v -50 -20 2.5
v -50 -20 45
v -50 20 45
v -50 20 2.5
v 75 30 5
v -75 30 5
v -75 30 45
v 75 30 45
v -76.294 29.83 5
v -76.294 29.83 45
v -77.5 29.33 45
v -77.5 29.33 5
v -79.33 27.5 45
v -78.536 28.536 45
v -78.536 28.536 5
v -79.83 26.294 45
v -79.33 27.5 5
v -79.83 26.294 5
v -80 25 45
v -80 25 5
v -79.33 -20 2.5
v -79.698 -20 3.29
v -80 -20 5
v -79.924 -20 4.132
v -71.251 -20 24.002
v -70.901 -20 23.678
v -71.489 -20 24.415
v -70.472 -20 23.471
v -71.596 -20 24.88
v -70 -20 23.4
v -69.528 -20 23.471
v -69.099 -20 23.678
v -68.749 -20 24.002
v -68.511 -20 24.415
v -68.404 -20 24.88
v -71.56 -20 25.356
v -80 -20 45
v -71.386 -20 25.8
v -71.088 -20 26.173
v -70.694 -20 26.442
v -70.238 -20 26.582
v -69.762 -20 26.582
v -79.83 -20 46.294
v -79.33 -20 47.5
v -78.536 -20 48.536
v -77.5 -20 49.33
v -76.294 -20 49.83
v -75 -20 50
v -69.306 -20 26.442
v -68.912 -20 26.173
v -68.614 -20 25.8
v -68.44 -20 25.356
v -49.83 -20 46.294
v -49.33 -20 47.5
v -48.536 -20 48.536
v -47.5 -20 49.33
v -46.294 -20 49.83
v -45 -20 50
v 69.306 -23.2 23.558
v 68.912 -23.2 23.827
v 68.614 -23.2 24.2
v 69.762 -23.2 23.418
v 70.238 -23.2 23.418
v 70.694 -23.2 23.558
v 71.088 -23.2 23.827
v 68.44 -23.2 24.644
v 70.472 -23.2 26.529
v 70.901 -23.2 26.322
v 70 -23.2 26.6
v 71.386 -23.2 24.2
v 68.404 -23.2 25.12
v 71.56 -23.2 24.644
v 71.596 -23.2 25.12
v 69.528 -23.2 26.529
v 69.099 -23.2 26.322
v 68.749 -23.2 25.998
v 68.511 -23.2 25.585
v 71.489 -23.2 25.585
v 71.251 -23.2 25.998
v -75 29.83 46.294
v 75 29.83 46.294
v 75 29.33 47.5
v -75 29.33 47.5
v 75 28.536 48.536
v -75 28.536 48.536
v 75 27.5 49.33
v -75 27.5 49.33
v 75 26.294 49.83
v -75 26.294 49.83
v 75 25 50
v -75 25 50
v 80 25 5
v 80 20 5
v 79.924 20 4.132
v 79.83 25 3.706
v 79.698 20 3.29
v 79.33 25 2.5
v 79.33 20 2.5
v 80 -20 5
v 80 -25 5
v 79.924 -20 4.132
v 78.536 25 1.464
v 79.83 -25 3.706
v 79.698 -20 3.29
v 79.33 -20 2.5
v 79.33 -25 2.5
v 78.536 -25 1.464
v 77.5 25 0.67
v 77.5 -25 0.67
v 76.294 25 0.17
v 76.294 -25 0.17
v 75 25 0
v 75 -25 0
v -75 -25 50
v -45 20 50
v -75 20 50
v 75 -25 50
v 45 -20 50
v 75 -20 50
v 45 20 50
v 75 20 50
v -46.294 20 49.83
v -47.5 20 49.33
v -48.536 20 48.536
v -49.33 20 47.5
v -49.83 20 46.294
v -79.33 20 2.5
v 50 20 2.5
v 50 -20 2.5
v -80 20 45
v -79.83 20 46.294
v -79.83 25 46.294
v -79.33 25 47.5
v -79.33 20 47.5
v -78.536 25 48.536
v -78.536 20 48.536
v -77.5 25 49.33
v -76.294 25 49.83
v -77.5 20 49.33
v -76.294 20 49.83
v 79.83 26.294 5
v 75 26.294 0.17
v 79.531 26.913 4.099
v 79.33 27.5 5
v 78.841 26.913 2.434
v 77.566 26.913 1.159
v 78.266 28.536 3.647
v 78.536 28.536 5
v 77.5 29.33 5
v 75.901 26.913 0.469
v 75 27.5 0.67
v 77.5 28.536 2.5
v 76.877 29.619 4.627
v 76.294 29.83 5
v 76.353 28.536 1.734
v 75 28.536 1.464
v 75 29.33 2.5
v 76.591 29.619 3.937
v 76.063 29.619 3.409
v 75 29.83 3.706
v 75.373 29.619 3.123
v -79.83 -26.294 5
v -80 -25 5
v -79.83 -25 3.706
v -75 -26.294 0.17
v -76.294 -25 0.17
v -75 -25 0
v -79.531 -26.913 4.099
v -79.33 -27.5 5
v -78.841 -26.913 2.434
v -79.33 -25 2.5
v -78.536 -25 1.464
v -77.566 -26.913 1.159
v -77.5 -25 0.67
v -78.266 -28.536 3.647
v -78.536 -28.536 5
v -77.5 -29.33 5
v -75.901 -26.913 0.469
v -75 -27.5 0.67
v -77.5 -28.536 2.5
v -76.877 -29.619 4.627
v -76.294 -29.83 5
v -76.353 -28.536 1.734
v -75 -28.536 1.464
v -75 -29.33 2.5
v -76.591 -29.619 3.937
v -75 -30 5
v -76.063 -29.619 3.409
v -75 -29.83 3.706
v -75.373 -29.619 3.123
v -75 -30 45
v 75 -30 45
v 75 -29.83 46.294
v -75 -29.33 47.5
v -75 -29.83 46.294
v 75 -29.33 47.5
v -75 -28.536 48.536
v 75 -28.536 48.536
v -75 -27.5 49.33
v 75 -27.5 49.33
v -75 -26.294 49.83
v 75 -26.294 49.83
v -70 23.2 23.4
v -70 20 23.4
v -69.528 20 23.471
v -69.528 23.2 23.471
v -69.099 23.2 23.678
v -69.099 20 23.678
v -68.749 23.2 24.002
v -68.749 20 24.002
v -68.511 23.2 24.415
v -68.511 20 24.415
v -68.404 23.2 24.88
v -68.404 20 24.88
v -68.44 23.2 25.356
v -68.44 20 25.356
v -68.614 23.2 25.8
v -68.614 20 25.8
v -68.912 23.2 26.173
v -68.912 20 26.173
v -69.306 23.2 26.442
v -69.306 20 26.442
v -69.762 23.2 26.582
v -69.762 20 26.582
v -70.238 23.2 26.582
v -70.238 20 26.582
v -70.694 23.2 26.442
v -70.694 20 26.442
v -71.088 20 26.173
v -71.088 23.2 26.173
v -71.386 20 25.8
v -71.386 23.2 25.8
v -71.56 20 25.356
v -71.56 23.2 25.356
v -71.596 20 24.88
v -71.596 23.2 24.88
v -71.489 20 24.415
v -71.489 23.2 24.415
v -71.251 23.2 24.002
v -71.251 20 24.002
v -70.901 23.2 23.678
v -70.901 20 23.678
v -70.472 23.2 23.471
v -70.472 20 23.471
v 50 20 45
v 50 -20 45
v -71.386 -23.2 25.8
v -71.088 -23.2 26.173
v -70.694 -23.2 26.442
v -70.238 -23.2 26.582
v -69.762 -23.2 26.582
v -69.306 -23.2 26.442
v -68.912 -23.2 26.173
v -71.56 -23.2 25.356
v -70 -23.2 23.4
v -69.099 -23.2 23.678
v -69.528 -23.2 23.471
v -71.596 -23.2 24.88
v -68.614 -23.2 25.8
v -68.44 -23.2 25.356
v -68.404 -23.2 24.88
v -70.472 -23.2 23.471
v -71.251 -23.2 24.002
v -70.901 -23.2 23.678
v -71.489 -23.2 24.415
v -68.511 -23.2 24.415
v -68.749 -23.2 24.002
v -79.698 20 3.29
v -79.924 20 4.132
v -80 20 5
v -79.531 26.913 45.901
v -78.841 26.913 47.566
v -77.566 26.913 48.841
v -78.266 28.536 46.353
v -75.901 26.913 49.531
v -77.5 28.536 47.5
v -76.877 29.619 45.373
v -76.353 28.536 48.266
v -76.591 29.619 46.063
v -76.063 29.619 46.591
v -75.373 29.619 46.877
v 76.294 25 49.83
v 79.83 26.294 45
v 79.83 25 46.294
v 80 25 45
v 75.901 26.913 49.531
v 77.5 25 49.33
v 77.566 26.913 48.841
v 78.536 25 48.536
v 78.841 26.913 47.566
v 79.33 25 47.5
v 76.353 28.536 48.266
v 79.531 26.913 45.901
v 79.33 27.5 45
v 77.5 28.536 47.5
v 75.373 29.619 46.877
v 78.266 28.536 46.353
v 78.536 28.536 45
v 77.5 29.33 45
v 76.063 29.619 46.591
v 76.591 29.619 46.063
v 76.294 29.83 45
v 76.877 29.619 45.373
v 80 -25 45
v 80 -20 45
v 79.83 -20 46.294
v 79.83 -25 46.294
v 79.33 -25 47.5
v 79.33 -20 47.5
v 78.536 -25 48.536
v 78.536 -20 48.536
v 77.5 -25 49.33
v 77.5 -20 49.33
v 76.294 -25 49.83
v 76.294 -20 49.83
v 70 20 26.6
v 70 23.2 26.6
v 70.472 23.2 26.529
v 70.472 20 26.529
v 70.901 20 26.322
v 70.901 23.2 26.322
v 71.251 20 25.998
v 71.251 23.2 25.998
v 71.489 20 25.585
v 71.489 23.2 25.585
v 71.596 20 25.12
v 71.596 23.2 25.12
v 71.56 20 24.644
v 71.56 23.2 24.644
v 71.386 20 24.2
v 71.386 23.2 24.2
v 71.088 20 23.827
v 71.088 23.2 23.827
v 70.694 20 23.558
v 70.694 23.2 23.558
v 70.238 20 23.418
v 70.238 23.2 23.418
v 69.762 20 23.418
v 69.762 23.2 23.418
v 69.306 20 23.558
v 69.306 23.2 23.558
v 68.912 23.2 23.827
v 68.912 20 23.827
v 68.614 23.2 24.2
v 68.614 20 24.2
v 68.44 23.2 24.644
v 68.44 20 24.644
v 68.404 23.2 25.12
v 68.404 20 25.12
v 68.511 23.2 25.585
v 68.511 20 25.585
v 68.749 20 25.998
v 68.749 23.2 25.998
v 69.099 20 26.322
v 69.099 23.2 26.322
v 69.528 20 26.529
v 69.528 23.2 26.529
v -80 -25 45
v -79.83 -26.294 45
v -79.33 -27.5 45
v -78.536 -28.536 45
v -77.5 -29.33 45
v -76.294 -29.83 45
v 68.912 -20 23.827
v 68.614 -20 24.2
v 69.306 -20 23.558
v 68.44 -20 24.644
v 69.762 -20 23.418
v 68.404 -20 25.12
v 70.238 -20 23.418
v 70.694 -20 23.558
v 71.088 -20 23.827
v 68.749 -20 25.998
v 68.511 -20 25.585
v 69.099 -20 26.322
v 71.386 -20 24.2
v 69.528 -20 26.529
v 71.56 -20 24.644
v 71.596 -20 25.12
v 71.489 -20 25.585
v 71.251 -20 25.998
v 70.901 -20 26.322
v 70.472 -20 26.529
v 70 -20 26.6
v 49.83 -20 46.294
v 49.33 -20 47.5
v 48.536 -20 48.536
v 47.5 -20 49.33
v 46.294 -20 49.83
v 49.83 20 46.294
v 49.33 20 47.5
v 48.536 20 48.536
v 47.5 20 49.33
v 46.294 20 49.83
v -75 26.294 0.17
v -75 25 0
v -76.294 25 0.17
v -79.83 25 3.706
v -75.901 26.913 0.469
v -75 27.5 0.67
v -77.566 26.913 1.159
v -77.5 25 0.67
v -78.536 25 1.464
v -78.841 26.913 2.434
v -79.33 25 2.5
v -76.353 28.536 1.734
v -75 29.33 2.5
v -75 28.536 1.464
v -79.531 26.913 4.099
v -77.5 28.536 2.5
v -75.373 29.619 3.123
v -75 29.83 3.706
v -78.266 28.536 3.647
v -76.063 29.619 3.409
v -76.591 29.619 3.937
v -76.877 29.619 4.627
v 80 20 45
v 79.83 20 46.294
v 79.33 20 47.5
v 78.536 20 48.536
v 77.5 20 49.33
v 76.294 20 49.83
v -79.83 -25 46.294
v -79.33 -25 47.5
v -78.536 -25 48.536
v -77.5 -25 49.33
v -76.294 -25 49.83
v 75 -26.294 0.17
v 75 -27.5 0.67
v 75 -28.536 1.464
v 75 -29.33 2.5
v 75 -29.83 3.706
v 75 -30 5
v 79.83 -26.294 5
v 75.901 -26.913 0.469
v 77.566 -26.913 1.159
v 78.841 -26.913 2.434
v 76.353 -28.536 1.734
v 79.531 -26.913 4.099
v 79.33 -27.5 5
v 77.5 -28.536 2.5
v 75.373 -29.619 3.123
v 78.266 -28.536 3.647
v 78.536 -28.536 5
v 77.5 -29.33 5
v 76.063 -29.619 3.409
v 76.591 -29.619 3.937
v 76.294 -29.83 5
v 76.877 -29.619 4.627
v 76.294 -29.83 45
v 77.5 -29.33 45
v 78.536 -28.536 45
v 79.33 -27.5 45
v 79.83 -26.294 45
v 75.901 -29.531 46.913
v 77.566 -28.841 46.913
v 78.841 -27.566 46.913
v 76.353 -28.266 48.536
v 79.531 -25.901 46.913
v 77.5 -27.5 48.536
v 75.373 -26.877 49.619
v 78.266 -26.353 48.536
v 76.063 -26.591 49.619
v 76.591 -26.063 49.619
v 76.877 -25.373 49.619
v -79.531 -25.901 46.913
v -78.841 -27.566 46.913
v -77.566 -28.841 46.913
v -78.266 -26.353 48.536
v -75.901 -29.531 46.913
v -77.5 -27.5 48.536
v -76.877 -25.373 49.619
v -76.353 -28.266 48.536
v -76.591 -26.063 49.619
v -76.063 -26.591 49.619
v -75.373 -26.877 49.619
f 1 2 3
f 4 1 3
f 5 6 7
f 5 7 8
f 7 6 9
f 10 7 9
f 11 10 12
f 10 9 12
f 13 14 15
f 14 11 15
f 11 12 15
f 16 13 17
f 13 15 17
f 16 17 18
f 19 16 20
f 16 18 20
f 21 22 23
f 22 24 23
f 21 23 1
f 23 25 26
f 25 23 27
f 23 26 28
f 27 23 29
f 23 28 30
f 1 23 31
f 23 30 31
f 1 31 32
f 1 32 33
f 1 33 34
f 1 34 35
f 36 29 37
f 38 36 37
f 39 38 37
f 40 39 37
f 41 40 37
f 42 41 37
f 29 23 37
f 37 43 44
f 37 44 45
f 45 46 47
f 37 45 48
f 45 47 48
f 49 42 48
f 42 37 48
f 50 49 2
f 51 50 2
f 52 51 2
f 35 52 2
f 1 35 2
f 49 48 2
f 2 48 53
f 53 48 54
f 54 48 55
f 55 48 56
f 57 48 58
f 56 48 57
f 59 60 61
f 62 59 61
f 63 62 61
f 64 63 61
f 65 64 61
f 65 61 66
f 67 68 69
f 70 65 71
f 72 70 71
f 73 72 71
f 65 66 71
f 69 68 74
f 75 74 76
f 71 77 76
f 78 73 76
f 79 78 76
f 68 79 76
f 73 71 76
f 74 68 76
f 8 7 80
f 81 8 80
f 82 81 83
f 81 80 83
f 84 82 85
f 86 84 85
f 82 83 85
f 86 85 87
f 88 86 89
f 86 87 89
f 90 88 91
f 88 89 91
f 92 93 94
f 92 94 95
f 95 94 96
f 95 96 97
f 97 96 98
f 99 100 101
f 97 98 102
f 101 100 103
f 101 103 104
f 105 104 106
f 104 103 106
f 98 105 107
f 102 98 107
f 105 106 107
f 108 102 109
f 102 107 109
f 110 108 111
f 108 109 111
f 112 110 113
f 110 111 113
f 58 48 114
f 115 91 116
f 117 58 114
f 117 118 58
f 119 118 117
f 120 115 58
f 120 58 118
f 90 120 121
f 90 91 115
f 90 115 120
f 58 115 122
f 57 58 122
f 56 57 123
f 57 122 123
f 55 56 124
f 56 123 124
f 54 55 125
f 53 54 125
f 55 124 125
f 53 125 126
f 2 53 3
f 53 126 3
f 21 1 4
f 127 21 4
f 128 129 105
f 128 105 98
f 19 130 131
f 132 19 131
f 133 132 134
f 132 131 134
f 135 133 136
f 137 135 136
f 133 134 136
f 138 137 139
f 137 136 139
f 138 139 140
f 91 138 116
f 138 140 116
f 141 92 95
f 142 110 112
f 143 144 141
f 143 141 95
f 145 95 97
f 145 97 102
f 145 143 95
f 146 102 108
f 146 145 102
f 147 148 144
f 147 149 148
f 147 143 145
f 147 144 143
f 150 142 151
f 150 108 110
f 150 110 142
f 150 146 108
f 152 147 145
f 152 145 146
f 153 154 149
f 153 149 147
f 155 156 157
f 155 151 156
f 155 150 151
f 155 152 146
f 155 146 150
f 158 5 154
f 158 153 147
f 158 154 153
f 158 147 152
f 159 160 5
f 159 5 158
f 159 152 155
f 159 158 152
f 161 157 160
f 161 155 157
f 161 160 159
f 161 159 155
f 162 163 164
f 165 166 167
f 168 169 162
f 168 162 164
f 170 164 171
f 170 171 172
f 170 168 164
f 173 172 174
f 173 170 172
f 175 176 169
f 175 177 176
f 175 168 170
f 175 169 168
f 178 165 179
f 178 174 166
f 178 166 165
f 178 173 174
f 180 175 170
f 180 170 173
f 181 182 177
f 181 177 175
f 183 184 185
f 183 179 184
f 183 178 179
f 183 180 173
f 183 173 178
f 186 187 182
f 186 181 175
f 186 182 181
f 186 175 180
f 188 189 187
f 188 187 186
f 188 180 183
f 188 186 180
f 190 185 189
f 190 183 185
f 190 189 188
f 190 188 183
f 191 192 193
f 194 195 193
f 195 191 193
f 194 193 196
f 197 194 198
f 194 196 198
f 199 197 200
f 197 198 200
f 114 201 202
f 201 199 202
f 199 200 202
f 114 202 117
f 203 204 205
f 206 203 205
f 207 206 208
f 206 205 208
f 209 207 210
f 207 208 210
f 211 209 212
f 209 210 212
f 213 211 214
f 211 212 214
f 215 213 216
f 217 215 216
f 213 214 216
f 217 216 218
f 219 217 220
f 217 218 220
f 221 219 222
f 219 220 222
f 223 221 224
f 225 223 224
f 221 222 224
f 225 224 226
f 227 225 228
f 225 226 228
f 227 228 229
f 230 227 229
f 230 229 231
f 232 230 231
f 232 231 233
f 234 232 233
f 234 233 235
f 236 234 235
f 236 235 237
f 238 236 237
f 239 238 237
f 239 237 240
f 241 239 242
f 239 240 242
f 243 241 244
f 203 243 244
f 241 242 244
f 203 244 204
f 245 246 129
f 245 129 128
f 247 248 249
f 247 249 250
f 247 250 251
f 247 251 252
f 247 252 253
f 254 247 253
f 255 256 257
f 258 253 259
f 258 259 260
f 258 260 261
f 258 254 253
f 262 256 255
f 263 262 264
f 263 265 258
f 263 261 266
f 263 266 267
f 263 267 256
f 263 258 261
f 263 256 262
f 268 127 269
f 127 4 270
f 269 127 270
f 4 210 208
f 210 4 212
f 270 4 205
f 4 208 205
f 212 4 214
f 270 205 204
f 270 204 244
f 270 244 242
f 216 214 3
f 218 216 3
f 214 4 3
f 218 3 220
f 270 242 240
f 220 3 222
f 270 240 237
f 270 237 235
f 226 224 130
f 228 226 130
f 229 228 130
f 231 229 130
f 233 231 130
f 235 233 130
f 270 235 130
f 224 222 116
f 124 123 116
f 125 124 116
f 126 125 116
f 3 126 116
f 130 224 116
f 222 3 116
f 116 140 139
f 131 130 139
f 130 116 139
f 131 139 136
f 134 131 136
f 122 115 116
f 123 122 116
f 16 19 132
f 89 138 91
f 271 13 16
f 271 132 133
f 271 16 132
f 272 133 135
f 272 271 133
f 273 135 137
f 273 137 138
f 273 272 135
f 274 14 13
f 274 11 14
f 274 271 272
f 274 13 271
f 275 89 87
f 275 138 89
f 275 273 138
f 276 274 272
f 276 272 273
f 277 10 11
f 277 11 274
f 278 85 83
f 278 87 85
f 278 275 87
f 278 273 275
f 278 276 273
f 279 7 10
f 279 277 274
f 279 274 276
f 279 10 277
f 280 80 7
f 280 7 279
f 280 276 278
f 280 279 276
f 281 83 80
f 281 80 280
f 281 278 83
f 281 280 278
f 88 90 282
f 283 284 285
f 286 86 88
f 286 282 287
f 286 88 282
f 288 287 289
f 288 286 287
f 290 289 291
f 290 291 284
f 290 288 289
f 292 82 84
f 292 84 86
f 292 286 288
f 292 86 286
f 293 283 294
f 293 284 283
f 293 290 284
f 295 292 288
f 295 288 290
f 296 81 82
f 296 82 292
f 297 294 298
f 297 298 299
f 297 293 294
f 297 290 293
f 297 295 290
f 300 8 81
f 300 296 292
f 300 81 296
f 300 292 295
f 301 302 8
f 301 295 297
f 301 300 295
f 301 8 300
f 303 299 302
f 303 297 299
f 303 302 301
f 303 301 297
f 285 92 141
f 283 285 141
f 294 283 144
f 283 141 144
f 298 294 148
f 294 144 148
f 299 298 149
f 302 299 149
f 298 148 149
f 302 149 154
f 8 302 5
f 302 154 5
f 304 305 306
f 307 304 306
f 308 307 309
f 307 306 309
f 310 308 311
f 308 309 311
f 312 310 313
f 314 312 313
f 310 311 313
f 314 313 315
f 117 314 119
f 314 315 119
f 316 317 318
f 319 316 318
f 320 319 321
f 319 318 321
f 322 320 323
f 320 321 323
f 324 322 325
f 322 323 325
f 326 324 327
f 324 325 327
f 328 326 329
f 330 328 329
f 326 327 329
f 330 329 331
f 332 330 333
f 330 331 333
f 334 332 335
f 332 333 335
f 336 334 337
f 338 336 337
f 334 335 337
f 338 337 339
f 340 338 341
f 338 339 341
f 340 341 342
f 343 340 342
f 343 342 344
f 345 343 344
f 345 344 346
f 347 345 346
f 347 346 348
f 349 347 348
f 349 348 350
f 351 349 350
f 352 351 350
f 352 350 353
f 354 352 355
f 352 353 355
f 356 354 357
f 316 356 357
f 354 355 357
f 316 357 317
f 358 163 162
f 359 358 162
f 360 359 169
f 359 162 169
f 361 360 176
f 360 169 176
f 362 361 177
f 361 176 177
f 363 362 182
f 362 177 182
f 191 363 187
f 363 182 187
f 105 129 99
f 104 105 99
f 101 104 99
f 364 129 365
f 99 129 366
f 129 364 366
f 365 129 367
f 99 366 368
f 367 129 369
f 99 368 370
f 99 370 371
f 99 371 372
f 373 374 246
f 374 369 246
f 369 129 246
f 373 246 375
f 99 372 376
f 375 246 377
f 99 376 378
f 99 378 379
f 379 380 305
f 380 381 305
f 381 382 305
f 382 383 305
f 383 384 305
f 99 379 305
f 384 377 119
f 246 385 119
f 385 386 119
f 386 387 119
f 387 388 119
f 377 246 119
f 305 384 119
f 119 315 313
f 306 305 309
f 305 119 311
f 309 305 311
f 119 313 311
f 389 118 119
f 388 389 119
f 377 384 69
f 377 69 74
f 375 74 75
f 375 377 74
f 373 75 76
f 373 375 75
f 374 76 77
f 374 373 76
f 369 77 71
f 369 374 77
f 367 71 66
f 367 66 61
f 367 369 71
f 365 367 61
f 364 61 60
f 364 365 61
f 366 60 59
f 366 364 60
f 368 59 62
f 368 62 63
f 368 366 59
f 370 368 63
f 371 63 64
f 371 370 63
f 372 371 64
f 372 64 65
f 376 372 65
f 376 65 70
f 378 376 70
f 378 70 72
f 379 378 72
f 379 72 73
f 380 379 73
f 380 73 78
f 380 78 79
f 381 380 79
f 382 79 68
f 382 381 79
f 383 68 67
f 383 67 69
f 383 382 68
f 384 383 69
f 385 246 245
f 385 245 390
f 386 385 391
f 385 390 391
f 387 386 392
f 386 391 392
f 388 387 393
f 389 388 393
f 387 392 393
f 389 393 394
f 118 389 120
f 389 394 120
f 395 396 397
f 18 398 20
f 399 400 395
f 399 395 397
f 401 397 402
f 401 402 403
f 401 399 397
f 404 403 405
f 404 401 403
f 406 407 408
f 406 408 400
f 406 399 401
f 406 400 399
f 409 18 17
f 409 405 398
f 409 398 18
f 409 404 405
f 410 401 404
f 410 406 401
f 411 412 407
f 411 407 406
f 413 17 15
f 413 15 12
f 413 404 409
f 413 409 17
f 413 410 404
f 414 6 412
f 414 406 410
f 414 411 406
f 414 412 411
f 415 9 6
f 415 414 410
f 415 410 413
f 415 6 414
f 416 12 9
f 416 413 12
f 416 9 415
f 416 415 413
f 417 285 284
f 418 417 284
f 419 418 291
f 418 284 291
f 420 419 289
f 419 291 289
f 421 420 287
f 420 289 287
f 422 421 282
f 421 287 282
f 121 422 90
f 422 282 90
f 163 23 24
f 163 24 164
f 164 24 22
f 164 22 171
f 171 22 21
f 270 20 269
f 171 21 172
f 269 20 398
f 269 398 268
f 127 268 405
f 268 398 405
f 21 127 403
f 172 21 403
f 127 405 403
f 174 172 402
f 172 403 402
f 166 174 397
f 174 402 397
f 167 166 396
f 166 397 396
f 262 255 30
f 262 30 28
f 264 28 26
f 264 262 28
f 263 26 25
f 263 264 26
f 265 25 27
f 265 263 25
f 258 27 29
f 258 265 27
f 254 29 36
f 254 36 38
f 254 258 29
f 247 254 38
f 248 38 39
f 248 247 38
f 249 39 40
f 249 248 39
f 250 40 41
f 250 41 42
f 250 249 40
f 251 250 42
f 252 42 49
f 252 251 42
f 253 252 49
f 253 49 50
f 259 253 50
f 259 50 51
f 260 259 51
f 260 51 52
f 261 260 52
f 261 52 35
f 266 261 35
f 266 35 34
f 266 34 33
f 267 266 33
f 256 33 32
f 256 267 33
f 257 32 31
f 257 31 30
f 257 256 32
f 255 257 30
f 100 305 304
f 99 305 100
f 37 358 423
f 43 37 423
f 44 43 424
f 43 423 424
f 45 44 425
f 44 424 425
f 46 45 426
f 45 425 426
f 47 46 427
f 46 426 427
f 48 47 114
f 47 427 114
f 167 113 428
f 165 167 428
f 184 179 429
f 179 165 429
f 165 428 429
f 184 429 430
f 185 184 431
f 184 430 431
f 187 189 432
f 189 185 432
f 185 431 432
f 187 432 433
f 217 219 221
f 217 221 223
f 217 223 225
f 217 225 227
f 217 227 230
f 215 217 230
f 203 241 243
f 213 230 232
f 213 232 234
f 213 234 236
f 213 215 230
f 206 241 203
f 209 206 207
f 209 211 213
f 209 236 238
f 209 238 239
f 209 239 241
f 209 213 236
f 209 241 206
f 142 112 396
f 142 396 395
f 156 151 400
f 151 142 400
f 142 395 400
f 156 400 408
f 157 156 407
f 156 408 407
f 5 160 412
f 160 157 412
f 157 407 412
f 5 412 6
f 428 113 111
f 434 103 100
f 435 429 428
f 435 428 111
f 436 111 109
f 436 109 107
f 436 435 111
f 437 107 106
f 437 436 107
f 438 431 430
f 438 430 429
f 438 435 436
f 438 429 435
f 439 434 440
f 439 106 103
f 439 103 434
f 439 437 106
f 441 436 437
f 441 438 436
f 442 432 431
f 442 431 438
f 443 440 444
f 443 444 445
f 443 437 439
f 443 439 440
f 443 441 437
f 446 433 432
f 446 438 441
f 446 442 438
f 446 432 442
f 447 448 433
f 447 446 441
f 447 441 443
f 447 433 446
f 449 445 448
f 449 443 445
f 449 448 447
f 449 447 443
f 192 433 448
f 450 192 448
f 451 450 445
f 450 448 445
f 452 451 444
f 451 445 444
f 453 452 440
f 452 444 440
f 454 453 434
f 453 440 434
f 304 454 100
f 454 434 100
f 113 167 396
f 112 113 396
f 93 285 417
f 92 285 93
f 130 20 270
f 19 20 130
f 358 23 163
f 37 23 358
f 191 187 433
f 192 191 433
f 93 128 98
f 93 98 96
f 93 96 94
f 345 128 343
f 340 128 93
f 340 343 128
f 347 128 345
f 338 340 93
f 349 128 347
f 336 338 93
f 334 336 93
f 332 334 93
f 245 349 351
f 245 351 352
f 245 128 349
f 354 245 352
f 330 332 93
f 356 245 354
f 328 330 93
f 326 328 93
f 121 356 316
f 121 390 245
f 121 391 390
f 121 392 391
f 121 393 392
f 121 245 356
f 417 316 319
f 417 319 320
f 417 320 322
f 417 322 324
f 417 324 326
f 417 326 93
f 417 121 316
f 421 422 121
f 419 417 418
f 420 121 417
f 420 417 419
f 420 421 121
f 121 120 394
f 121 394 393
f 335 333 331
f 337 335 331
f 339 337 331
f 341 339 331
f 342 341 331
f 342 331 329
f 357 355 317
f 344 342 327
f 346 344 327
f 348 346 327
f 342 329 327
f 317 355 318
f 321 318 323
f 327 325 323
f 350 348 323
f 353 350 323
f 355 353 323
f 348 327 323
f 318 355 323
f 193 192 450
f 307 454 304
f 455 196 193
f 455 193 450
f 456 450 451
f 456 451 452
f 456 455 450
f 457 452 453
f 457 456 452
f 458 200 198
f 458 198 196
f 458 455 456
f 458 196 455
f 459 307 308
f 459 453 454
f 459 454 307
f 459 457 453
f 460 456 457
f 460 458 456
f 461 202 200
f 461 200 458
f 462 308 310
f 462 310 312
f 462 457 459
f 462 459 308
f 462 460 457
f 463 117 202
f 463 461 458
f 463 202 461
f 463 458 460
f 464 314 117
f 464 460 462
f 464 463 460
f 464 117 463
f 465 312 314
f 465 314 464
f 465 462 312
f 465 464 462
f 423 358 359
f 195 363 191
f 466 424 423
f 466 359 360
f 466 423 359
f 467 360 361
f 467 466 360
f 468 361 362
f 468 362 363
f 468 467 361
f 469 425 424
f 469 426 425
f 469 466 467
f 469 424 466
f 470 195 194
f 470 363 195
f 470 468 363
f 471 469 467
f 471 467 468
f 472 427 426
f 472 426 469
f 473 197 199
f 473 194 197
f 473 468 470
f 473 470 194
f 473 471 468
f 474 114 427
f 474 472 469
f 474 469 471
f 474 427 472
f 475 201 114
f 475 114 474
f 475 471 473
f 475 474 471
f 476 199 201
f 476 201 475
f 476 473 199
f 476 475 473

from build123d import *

# Parameters (mm, degrees)
SKETCH2_W           = 160
SKETCH2_H           = 60
BOSS_EXTRUDE1_DEPTH = 50
SKETCH4_W           = 30
SKETCH4_H           = 40
CUT_EXTRUDE1_DEPTH  = 99.994949366
SKETCH5_R           = 1.6
CUT_EXTRUDE2_DEPTH  = 3.2
CUT_EXTRUDE3_START  = -3.2
SKETCH6_R           = 1.6
CUT_EXTRUDE3_DEPTH  = 3.2
CUT_EXTRUDE5_START  = -6.8
SKETCH7_R           = 1.6
CUT_EXTRUDE5_DEPTH  = 3.2
CUT_EXTRUDE6_START  = -10
SKETCH8_R           = 1.6
CUT_EXTRUDE6_DEPTH  = 3.2
SKETCH9_W           = 2.5
SKETCH9_H           = 40
BOSS_EXTRUDE2_DEPTH = 30
SKETCH10_W          = 2.5
SKETCH10_H          = 40
BOSS_EXTRUDE3_DEPTH = 30
FILLET1_R           = 5


with BuildPart() as part:
    # Sketch2 → Boss-Extrude1 (new body)
    with BuildSketch(Plane.XY):
        Rectangle(SKETCH2_W, SKETCH2_H)
    extrude(amount=BOSS_EXTRUDE1_DEPTH)

    # Sketch4 → Cut-Extrude1 (cut, through all)
    with BuildSketch(Plane.XY.offset(50)):
        with Locations((65, 0)):
            Rectangle(SKETCH4_W, SKETCH4_H)
        with Locations((-65, 0)):
            Rectangle(SKETCH4_W, SKETCH4_H)
    extrude(amount=-CUT_EXTRUDE1_DEPTH, mode=Mode.SUBTRACT)

    # Sketch5 → Cut-Extrude2 (cut)
    with BuildSketch(Plane(origin=(0, 20, 0), x_dir=(-1, 0, 0), z_dir=(0, -1, 0))):
        with Locations(Location((70, -25, 0), (0, 0, 90))):
            Circle(SKETCH5_R)
    extrude(amount=-CUT_EXTRUDE2_DEPTH, mode=Mode.SUBTRACT)

    # Sketch6 → Cut-Extrude3 (cut)
    with BuildSketch(Plane(origin=(0, -20, 0), x_dir=(1, 0, 0), z_dir=(0, 1, 0)).offset(CUT_EXTRUDE3_START)):
        with Locations(Location((-70, -25, 0), (0, 0, 90))):
            Circle(SKETCH6_R)
    extrude(amount=CUT_EXTRUDE3_DEPTH, mode=Mode.SUBTRACT)

    # Sketch7 → Cut-Extrude5 (cut)
    with BuildSketch(Plane(origin=(0, 30, 0), x_dir=(1, 0, 0), z_dir=(0, 1, 0)).offset(CUT_EXTRUDE5_START)):
        with Locations(Location((70, -25, 0), (0, 0, 270))):
            Circle(SKETCH7_R)
    extrude(amount=-CUT_EXTRUDE5_DEPTH, mode=Mode.SUBTRACT)

    # Sketch8 → Cut-Extrude6 (cut)
    with BuildSketch(Plane.XZ.offset(30).offset(CUT_EXTRUDE6_START)):
        with Locations(Location((70, 25, 0), (0, 0, 90))):
            Circle(SKETCH8_R)
    extrude(amount=CUT_EXTRUDE6_DEPTH, mode=Mode.SUBTRACT)

    # Sketch9 → Boss-Extrude2 (add)
    with BuildSketch(Plane.ZY.offset(50)):
        with Locations((1.25, 0)):
            Rectangle(SKETCH9_W, SKETCH9_H)
    extrude(amount=BOSS_EXTRUDE2_DEPTH)

    # Sketch10 → Boss-Extrude3 (add)
    with BuildSketch(Plane(origin=(50, 0, 0), x_dir=(0, 0, -1), z_dir=(1, 0, 0))):
        with Locations((-1.25, 0)):
            Rectangle(SKETCH10_W, SKETCH10_H)
    extrude(amount=BOSS_EXTRUDE3_DEPTH)

    # Fillet1
    # the kernel refuses this fillet: 5 mm, written as the material it takes off along each edge
    with BuildSketch(Plane(origin=(-75, -25, 45), x_dir=(0, -1, 0), z_dir=(0, 0, 1))) as fillet1_piece_1_section:
        Polygon((0, 0), (FILLET1_R, 0), (FILLET1_R, -FILLET1_R), (0, -FILLET1_R), align=None)
    fillet1_piece_1 = extrude(amount=FILLET1_R, mode=Mode.PRIVATE)
    fillet1_piece_1 = fillet1_piece_1 - Plane(origin=(-75, -25, 45), x_dir=(0.7071067811865475, 0.7071067811865475, 0), z_dir=(0, 0, 1)) * Sphere(FILLET1_R, mode=Mode.PRIVATE)
    add(fillet1_piece_1, mode=Mode.SUBTRACT)
    with BuildSketch(Plane(origin=(-75, 25, 45), x_dir=(0, 0, 1), z_dir=(0, 1, 0))) as fillet1_piece_2_section:
        Polygon((0, 0), (FILLET1_R, 0), (FILLET1_R, -FILLET1_R), (0, -FILLET1_R), align=None)
    fillet1_piece_2 = extrude(amount=FILLET1_R, mode=Mode.PRIVATE)
    fillet1_piece_2 = fillet1_piece_2 - Plane(origin=(-75, 25, 45), x_dir=(0.7071067811865475, 0, -0.7071067811865475), z_dir=(0, 1, 0)) * Sphere(FILLET1_R, mode=Mode.PRIVATE)
    add(fillet1_piece_2, mode=Mode.SUBTRACT)
    with BuildSketch(Plane(origin=(75, 25, 45), x_dir=(0, 0, 1), z_dir=(0, 1, 0))) as fillet1_piece_3_section:
        Polygon((0, 0), (FILLET1_R, 0), (FILLET1_R, FILLET1_R), (0, FILLET1_R), align=None)
    fillet1_piece_3 = extrude(amount=FILLET1_R, mode=Mode.PRIVATE)
    fillet1_piece_3 = fillet1_piece_3 - Plane(origin=(75, 25, 45), x_dir=(-0.7071067811865475, 0, -0.7071067811865475), z_dir=(0, 1, 0)) * Sphere(FILLET1_R, mode=Mode.PRIVATE)
    add(fillet1_piece_3, mode=Mode.SUBTRACT)
    with BuildSketch(Plane(origin=(75, -25, 45), x_dir=(0, -1, 0), z_dir=(0, 0, 1))) as fillet1_piece_4_section:
        Polygon((0, 0), (FILLET1_R, 0), (FILLET1_R, FILLET1_R), (0, FILLET1_R), align=None)
    fillet1_piece_4 = extrude(amount=FILLET1_R, mode=Mode.PRIVATE)
    fillet1_piece_4 = fillet1_piece_4 - Plane(origin=(75, -25, 45), x_dir=(-0.7071067811865476, 0.7071067811865475, 0), z_dir=(0, 0, 1)) * Sphere(FILLET1_R, mode=Mode.PRIVATE)
    add(fillet1_piece_4, mode=Mode.SUBTRACT)
    with BuildSketch(Plane(origin=(75, -25, 5), x_dir=(0, 0, -1), z_dir=(0, -1, 0))) as fillet1_piece_5_section:
        Polygon((0, 0), (FILLET1_R, 0), (FILLET1_R, FILLET1_R), (0, FILLET1_R), align=None)
    fillet1_piece_5 = extrude(amount=FILLET1_R, mode=Mode.PRIVATE)
    fillet1_piece_5 = fillet1_piece_5 - Plane(origin=(75, -25, 5), x_dir=(-0.7071067811865475, 0, 0.7071067811865475), z_dir=(0, -1, 0)) * Sphere(FILLET1_R, mode=Mode.PRIVATE)
    add(fillet1_piece_5, mode=Mode.SUBTRACT)
    with BuildSketch(Plane(origin=(75, 25, 5), x_dir=(0, 0, -1), z_dir=(0, 1, 0))) as fillet1_piece_6_section:
        Polygon((0, 0), (FILLET1_R, 0), (FILLET1_R, -FILLET1_R), (0, -FILLET1_R), align=None)
    fillet1_piece_6 = extrude(amount=FILLET1_R, mode=Mode.PRIVATE)
    fillet1_piece_6 = fillet1_piece_6 - Plane(origin=(75, 25, 5), x_dir=(-0.7071067811865475, 0, 0.7071067811865475), z_dir=(0, 1, 0)) * Sphere(FILLET1_R, mode=Mode.PRIVATE)
    add(fillet1_piece_6, mode=Mode.SUBTRACT)
    with BuildSketch(Plane(origin=(-75, 25, 5), x_dir=(0, 0, -1), z_dir=(0, 1, 0))) as fillet1_piece_7_section:
        Polygon((0, 0), (FILLET1_R, 0), (FILLET1_R, FILLET1_R), (0, FILLET1_R), align=None)
    fillet1_piece_7 = extrude(amount=FILLET1_R, mode=Mode.PRIVATE)
    fillet1_piece_7 = fillet1_piece_7 - Plane(origin=(-75, 25, 5), x_dir=(0.7071067811865475, 0, 0.7071067811865475), z_dir=(0, 1, 0)) * Sphere(FILLET1_R, mode=Mode.PRIVATE)
    add(fillet1_piece_7, mode=Mode.SUBTRACT)
    with BuildSketch(Plane(origin=(-75, -25, 5), x_dir=(0, 0, -1), z_dir=(0, -1, 0))) as fillet1_piece_8_section:
        Polygon((0, 0), (FILLET1_R, 0), (FILLET1_R, -FILLET1_R), (0, -FILLET1_R), align=None)
    fillet1_piece_8 = extrude(amount=FILLET1_R, mode=Mode.PRIVATE)
    fillet1_piece_8 = fillet1_piece_8 - Plane(origin=(-75, -25, 5), x_dir=(0.7071067811865475, 0, 0.7071067811865475), z_dir=(0, -1, 0)) * Sphere(FILLET1_R, mode=Mode.PRIVATE)
    add(fillet1_piece_8, mode=Mode.SUBTRACT)
    with BuildSketch(Plane(origin=(-80, -25, 50), x_dir=(1, 0, 0), z_dir=(0, 1, 0)), Plane(origin=(-80, 7.5, 50), x_dir=(1, 0, 0), z_dir=(0, 1, 0)), Plane(origin=(80, 25, 50), x_dir=(-1, 0, 0), z_dir=(0, -1, 0)), Plane(origin=(80, -7.5, 50), x_dir=(-1, 0, 0), z_dir=(0, -1, 0))) as fillet1_piece_9:
        with BuildLine():
            CenterArc((FILLET1_R, FILLET1_R), FILLET1_R, 180, 90)
            Line((0, FILLET1_R), (0, 0))
            Line((0, 0), (FILLET1_R, 0))
        make_face()
    extrude(amount=17.5, mode=Mode.SUBTRACT)
    with BuildSketch(Plane(origin=(50, 20, 50), x_dir=(-1, 0, 0), z_dir=(0, -1, 0)), Plane(origin=(80, 30, 5), x_dir=(-1, 0, 0), z_dir=(0, 0, 1)), Plane(origin=(-80, -30, 5), x_dir=(1, 0, 0), z_dir=(0, 0, 1))) as fillet1_piece_10:
        with BuildLine():
            CenterArc((FILLET1_R, FILLET1_R), FILLET1_R, 180, 90)
            Line((0, FILLET1_R), (0, 0))
            Line((0, 0), (FILLET1_R, 0))
        make_face()
    extrude(amount=40, mode=Mode.SUBTRACT)
    with BuildSketch(Plane(origin=(80, -30, 5), x_dir=(-1, 0, 0), z_dir=(0, 0, 1)), Plane(origin=(-80, 30, 5), x_dir=(1, 0, 0), z_dir=(0, 0, 1)), Plane(origin=(-50, 20, 50), x_dir=(1, 0, 0), z_dir=(0, -1, 0))) as fillet1_piece_11:
        with BuildLine():
            CenterArc((FILLET1_R, -FILLET1_R), FILLET1_R, 90, 90)
            Line((0, -FILLET1_R), (0, 0))
            Line((0, 0), (FILLET1_R, 0))
        make_face()
    extrude(amount=40, mode=Mode.SUBTRACT)
    with BuildSketch(Plane(origin=(80, -25, 0), x_dir=(-1, 0, 0), z_dir=(0, 1, 0)), Plane(origin=(-80, 25, 0), x_dir=(1, 0, 0), z_dir=(0, -1, 0))) as fillet1_piece_12:
        with BuildLine():
            CenterArc((FILLET1_R, FILLET1_R), FILLET1_R, 180, 90)
            Line((0, FILLET1_R), (0, 0))
            Line((0, 0), (FILLET1_R, 0))
        make_face()
    extrude(amount=50, mode=Mode.SUBTRACT)
    with BuildSketch(Plane(origin=(-75, 30, 0), x_dir=(0, 0, 1), z_dir=(1, 0, 0)), Plane(origin=(75, -30, 0), x_dir=(0, 0, 1), z_dir=(-1, 0, 0)), Plane(origin=(75, -30, 50), x_dir=(0, 1, 0), z_dir=(-1, 0, 0))) as fillet1_piece_13:
        with BuildLine():
            CenterArc((FILLET1_R, FILLET1_R), FILLET1_R, 180, 90)
            Line((0, FILLET1_R), (0, 0))
            Line((0, 0), (FILLET1_R, 0))
        make_face()
    extrude(amount=150, mode=Mode.SUBTRACT)
    with BuildSketch(Plane(origin=(-75, 30, 50), x_dir=(0, 0, -1), z_dir=(1, 0, 0))) as fillet1_piece_14:
        with BuildLine():
            CenterArc((FILLET1_R, -FILLET1_R), FILLET1_R, 90, 90)
            Line((0, -FILLET1_R), (0, 0))
            Line((0, 0), (FILLET1_R, 0))
        make_face()
    extrude(amount=150, mode=Mode.SUBTRACT)


solid = part.part
